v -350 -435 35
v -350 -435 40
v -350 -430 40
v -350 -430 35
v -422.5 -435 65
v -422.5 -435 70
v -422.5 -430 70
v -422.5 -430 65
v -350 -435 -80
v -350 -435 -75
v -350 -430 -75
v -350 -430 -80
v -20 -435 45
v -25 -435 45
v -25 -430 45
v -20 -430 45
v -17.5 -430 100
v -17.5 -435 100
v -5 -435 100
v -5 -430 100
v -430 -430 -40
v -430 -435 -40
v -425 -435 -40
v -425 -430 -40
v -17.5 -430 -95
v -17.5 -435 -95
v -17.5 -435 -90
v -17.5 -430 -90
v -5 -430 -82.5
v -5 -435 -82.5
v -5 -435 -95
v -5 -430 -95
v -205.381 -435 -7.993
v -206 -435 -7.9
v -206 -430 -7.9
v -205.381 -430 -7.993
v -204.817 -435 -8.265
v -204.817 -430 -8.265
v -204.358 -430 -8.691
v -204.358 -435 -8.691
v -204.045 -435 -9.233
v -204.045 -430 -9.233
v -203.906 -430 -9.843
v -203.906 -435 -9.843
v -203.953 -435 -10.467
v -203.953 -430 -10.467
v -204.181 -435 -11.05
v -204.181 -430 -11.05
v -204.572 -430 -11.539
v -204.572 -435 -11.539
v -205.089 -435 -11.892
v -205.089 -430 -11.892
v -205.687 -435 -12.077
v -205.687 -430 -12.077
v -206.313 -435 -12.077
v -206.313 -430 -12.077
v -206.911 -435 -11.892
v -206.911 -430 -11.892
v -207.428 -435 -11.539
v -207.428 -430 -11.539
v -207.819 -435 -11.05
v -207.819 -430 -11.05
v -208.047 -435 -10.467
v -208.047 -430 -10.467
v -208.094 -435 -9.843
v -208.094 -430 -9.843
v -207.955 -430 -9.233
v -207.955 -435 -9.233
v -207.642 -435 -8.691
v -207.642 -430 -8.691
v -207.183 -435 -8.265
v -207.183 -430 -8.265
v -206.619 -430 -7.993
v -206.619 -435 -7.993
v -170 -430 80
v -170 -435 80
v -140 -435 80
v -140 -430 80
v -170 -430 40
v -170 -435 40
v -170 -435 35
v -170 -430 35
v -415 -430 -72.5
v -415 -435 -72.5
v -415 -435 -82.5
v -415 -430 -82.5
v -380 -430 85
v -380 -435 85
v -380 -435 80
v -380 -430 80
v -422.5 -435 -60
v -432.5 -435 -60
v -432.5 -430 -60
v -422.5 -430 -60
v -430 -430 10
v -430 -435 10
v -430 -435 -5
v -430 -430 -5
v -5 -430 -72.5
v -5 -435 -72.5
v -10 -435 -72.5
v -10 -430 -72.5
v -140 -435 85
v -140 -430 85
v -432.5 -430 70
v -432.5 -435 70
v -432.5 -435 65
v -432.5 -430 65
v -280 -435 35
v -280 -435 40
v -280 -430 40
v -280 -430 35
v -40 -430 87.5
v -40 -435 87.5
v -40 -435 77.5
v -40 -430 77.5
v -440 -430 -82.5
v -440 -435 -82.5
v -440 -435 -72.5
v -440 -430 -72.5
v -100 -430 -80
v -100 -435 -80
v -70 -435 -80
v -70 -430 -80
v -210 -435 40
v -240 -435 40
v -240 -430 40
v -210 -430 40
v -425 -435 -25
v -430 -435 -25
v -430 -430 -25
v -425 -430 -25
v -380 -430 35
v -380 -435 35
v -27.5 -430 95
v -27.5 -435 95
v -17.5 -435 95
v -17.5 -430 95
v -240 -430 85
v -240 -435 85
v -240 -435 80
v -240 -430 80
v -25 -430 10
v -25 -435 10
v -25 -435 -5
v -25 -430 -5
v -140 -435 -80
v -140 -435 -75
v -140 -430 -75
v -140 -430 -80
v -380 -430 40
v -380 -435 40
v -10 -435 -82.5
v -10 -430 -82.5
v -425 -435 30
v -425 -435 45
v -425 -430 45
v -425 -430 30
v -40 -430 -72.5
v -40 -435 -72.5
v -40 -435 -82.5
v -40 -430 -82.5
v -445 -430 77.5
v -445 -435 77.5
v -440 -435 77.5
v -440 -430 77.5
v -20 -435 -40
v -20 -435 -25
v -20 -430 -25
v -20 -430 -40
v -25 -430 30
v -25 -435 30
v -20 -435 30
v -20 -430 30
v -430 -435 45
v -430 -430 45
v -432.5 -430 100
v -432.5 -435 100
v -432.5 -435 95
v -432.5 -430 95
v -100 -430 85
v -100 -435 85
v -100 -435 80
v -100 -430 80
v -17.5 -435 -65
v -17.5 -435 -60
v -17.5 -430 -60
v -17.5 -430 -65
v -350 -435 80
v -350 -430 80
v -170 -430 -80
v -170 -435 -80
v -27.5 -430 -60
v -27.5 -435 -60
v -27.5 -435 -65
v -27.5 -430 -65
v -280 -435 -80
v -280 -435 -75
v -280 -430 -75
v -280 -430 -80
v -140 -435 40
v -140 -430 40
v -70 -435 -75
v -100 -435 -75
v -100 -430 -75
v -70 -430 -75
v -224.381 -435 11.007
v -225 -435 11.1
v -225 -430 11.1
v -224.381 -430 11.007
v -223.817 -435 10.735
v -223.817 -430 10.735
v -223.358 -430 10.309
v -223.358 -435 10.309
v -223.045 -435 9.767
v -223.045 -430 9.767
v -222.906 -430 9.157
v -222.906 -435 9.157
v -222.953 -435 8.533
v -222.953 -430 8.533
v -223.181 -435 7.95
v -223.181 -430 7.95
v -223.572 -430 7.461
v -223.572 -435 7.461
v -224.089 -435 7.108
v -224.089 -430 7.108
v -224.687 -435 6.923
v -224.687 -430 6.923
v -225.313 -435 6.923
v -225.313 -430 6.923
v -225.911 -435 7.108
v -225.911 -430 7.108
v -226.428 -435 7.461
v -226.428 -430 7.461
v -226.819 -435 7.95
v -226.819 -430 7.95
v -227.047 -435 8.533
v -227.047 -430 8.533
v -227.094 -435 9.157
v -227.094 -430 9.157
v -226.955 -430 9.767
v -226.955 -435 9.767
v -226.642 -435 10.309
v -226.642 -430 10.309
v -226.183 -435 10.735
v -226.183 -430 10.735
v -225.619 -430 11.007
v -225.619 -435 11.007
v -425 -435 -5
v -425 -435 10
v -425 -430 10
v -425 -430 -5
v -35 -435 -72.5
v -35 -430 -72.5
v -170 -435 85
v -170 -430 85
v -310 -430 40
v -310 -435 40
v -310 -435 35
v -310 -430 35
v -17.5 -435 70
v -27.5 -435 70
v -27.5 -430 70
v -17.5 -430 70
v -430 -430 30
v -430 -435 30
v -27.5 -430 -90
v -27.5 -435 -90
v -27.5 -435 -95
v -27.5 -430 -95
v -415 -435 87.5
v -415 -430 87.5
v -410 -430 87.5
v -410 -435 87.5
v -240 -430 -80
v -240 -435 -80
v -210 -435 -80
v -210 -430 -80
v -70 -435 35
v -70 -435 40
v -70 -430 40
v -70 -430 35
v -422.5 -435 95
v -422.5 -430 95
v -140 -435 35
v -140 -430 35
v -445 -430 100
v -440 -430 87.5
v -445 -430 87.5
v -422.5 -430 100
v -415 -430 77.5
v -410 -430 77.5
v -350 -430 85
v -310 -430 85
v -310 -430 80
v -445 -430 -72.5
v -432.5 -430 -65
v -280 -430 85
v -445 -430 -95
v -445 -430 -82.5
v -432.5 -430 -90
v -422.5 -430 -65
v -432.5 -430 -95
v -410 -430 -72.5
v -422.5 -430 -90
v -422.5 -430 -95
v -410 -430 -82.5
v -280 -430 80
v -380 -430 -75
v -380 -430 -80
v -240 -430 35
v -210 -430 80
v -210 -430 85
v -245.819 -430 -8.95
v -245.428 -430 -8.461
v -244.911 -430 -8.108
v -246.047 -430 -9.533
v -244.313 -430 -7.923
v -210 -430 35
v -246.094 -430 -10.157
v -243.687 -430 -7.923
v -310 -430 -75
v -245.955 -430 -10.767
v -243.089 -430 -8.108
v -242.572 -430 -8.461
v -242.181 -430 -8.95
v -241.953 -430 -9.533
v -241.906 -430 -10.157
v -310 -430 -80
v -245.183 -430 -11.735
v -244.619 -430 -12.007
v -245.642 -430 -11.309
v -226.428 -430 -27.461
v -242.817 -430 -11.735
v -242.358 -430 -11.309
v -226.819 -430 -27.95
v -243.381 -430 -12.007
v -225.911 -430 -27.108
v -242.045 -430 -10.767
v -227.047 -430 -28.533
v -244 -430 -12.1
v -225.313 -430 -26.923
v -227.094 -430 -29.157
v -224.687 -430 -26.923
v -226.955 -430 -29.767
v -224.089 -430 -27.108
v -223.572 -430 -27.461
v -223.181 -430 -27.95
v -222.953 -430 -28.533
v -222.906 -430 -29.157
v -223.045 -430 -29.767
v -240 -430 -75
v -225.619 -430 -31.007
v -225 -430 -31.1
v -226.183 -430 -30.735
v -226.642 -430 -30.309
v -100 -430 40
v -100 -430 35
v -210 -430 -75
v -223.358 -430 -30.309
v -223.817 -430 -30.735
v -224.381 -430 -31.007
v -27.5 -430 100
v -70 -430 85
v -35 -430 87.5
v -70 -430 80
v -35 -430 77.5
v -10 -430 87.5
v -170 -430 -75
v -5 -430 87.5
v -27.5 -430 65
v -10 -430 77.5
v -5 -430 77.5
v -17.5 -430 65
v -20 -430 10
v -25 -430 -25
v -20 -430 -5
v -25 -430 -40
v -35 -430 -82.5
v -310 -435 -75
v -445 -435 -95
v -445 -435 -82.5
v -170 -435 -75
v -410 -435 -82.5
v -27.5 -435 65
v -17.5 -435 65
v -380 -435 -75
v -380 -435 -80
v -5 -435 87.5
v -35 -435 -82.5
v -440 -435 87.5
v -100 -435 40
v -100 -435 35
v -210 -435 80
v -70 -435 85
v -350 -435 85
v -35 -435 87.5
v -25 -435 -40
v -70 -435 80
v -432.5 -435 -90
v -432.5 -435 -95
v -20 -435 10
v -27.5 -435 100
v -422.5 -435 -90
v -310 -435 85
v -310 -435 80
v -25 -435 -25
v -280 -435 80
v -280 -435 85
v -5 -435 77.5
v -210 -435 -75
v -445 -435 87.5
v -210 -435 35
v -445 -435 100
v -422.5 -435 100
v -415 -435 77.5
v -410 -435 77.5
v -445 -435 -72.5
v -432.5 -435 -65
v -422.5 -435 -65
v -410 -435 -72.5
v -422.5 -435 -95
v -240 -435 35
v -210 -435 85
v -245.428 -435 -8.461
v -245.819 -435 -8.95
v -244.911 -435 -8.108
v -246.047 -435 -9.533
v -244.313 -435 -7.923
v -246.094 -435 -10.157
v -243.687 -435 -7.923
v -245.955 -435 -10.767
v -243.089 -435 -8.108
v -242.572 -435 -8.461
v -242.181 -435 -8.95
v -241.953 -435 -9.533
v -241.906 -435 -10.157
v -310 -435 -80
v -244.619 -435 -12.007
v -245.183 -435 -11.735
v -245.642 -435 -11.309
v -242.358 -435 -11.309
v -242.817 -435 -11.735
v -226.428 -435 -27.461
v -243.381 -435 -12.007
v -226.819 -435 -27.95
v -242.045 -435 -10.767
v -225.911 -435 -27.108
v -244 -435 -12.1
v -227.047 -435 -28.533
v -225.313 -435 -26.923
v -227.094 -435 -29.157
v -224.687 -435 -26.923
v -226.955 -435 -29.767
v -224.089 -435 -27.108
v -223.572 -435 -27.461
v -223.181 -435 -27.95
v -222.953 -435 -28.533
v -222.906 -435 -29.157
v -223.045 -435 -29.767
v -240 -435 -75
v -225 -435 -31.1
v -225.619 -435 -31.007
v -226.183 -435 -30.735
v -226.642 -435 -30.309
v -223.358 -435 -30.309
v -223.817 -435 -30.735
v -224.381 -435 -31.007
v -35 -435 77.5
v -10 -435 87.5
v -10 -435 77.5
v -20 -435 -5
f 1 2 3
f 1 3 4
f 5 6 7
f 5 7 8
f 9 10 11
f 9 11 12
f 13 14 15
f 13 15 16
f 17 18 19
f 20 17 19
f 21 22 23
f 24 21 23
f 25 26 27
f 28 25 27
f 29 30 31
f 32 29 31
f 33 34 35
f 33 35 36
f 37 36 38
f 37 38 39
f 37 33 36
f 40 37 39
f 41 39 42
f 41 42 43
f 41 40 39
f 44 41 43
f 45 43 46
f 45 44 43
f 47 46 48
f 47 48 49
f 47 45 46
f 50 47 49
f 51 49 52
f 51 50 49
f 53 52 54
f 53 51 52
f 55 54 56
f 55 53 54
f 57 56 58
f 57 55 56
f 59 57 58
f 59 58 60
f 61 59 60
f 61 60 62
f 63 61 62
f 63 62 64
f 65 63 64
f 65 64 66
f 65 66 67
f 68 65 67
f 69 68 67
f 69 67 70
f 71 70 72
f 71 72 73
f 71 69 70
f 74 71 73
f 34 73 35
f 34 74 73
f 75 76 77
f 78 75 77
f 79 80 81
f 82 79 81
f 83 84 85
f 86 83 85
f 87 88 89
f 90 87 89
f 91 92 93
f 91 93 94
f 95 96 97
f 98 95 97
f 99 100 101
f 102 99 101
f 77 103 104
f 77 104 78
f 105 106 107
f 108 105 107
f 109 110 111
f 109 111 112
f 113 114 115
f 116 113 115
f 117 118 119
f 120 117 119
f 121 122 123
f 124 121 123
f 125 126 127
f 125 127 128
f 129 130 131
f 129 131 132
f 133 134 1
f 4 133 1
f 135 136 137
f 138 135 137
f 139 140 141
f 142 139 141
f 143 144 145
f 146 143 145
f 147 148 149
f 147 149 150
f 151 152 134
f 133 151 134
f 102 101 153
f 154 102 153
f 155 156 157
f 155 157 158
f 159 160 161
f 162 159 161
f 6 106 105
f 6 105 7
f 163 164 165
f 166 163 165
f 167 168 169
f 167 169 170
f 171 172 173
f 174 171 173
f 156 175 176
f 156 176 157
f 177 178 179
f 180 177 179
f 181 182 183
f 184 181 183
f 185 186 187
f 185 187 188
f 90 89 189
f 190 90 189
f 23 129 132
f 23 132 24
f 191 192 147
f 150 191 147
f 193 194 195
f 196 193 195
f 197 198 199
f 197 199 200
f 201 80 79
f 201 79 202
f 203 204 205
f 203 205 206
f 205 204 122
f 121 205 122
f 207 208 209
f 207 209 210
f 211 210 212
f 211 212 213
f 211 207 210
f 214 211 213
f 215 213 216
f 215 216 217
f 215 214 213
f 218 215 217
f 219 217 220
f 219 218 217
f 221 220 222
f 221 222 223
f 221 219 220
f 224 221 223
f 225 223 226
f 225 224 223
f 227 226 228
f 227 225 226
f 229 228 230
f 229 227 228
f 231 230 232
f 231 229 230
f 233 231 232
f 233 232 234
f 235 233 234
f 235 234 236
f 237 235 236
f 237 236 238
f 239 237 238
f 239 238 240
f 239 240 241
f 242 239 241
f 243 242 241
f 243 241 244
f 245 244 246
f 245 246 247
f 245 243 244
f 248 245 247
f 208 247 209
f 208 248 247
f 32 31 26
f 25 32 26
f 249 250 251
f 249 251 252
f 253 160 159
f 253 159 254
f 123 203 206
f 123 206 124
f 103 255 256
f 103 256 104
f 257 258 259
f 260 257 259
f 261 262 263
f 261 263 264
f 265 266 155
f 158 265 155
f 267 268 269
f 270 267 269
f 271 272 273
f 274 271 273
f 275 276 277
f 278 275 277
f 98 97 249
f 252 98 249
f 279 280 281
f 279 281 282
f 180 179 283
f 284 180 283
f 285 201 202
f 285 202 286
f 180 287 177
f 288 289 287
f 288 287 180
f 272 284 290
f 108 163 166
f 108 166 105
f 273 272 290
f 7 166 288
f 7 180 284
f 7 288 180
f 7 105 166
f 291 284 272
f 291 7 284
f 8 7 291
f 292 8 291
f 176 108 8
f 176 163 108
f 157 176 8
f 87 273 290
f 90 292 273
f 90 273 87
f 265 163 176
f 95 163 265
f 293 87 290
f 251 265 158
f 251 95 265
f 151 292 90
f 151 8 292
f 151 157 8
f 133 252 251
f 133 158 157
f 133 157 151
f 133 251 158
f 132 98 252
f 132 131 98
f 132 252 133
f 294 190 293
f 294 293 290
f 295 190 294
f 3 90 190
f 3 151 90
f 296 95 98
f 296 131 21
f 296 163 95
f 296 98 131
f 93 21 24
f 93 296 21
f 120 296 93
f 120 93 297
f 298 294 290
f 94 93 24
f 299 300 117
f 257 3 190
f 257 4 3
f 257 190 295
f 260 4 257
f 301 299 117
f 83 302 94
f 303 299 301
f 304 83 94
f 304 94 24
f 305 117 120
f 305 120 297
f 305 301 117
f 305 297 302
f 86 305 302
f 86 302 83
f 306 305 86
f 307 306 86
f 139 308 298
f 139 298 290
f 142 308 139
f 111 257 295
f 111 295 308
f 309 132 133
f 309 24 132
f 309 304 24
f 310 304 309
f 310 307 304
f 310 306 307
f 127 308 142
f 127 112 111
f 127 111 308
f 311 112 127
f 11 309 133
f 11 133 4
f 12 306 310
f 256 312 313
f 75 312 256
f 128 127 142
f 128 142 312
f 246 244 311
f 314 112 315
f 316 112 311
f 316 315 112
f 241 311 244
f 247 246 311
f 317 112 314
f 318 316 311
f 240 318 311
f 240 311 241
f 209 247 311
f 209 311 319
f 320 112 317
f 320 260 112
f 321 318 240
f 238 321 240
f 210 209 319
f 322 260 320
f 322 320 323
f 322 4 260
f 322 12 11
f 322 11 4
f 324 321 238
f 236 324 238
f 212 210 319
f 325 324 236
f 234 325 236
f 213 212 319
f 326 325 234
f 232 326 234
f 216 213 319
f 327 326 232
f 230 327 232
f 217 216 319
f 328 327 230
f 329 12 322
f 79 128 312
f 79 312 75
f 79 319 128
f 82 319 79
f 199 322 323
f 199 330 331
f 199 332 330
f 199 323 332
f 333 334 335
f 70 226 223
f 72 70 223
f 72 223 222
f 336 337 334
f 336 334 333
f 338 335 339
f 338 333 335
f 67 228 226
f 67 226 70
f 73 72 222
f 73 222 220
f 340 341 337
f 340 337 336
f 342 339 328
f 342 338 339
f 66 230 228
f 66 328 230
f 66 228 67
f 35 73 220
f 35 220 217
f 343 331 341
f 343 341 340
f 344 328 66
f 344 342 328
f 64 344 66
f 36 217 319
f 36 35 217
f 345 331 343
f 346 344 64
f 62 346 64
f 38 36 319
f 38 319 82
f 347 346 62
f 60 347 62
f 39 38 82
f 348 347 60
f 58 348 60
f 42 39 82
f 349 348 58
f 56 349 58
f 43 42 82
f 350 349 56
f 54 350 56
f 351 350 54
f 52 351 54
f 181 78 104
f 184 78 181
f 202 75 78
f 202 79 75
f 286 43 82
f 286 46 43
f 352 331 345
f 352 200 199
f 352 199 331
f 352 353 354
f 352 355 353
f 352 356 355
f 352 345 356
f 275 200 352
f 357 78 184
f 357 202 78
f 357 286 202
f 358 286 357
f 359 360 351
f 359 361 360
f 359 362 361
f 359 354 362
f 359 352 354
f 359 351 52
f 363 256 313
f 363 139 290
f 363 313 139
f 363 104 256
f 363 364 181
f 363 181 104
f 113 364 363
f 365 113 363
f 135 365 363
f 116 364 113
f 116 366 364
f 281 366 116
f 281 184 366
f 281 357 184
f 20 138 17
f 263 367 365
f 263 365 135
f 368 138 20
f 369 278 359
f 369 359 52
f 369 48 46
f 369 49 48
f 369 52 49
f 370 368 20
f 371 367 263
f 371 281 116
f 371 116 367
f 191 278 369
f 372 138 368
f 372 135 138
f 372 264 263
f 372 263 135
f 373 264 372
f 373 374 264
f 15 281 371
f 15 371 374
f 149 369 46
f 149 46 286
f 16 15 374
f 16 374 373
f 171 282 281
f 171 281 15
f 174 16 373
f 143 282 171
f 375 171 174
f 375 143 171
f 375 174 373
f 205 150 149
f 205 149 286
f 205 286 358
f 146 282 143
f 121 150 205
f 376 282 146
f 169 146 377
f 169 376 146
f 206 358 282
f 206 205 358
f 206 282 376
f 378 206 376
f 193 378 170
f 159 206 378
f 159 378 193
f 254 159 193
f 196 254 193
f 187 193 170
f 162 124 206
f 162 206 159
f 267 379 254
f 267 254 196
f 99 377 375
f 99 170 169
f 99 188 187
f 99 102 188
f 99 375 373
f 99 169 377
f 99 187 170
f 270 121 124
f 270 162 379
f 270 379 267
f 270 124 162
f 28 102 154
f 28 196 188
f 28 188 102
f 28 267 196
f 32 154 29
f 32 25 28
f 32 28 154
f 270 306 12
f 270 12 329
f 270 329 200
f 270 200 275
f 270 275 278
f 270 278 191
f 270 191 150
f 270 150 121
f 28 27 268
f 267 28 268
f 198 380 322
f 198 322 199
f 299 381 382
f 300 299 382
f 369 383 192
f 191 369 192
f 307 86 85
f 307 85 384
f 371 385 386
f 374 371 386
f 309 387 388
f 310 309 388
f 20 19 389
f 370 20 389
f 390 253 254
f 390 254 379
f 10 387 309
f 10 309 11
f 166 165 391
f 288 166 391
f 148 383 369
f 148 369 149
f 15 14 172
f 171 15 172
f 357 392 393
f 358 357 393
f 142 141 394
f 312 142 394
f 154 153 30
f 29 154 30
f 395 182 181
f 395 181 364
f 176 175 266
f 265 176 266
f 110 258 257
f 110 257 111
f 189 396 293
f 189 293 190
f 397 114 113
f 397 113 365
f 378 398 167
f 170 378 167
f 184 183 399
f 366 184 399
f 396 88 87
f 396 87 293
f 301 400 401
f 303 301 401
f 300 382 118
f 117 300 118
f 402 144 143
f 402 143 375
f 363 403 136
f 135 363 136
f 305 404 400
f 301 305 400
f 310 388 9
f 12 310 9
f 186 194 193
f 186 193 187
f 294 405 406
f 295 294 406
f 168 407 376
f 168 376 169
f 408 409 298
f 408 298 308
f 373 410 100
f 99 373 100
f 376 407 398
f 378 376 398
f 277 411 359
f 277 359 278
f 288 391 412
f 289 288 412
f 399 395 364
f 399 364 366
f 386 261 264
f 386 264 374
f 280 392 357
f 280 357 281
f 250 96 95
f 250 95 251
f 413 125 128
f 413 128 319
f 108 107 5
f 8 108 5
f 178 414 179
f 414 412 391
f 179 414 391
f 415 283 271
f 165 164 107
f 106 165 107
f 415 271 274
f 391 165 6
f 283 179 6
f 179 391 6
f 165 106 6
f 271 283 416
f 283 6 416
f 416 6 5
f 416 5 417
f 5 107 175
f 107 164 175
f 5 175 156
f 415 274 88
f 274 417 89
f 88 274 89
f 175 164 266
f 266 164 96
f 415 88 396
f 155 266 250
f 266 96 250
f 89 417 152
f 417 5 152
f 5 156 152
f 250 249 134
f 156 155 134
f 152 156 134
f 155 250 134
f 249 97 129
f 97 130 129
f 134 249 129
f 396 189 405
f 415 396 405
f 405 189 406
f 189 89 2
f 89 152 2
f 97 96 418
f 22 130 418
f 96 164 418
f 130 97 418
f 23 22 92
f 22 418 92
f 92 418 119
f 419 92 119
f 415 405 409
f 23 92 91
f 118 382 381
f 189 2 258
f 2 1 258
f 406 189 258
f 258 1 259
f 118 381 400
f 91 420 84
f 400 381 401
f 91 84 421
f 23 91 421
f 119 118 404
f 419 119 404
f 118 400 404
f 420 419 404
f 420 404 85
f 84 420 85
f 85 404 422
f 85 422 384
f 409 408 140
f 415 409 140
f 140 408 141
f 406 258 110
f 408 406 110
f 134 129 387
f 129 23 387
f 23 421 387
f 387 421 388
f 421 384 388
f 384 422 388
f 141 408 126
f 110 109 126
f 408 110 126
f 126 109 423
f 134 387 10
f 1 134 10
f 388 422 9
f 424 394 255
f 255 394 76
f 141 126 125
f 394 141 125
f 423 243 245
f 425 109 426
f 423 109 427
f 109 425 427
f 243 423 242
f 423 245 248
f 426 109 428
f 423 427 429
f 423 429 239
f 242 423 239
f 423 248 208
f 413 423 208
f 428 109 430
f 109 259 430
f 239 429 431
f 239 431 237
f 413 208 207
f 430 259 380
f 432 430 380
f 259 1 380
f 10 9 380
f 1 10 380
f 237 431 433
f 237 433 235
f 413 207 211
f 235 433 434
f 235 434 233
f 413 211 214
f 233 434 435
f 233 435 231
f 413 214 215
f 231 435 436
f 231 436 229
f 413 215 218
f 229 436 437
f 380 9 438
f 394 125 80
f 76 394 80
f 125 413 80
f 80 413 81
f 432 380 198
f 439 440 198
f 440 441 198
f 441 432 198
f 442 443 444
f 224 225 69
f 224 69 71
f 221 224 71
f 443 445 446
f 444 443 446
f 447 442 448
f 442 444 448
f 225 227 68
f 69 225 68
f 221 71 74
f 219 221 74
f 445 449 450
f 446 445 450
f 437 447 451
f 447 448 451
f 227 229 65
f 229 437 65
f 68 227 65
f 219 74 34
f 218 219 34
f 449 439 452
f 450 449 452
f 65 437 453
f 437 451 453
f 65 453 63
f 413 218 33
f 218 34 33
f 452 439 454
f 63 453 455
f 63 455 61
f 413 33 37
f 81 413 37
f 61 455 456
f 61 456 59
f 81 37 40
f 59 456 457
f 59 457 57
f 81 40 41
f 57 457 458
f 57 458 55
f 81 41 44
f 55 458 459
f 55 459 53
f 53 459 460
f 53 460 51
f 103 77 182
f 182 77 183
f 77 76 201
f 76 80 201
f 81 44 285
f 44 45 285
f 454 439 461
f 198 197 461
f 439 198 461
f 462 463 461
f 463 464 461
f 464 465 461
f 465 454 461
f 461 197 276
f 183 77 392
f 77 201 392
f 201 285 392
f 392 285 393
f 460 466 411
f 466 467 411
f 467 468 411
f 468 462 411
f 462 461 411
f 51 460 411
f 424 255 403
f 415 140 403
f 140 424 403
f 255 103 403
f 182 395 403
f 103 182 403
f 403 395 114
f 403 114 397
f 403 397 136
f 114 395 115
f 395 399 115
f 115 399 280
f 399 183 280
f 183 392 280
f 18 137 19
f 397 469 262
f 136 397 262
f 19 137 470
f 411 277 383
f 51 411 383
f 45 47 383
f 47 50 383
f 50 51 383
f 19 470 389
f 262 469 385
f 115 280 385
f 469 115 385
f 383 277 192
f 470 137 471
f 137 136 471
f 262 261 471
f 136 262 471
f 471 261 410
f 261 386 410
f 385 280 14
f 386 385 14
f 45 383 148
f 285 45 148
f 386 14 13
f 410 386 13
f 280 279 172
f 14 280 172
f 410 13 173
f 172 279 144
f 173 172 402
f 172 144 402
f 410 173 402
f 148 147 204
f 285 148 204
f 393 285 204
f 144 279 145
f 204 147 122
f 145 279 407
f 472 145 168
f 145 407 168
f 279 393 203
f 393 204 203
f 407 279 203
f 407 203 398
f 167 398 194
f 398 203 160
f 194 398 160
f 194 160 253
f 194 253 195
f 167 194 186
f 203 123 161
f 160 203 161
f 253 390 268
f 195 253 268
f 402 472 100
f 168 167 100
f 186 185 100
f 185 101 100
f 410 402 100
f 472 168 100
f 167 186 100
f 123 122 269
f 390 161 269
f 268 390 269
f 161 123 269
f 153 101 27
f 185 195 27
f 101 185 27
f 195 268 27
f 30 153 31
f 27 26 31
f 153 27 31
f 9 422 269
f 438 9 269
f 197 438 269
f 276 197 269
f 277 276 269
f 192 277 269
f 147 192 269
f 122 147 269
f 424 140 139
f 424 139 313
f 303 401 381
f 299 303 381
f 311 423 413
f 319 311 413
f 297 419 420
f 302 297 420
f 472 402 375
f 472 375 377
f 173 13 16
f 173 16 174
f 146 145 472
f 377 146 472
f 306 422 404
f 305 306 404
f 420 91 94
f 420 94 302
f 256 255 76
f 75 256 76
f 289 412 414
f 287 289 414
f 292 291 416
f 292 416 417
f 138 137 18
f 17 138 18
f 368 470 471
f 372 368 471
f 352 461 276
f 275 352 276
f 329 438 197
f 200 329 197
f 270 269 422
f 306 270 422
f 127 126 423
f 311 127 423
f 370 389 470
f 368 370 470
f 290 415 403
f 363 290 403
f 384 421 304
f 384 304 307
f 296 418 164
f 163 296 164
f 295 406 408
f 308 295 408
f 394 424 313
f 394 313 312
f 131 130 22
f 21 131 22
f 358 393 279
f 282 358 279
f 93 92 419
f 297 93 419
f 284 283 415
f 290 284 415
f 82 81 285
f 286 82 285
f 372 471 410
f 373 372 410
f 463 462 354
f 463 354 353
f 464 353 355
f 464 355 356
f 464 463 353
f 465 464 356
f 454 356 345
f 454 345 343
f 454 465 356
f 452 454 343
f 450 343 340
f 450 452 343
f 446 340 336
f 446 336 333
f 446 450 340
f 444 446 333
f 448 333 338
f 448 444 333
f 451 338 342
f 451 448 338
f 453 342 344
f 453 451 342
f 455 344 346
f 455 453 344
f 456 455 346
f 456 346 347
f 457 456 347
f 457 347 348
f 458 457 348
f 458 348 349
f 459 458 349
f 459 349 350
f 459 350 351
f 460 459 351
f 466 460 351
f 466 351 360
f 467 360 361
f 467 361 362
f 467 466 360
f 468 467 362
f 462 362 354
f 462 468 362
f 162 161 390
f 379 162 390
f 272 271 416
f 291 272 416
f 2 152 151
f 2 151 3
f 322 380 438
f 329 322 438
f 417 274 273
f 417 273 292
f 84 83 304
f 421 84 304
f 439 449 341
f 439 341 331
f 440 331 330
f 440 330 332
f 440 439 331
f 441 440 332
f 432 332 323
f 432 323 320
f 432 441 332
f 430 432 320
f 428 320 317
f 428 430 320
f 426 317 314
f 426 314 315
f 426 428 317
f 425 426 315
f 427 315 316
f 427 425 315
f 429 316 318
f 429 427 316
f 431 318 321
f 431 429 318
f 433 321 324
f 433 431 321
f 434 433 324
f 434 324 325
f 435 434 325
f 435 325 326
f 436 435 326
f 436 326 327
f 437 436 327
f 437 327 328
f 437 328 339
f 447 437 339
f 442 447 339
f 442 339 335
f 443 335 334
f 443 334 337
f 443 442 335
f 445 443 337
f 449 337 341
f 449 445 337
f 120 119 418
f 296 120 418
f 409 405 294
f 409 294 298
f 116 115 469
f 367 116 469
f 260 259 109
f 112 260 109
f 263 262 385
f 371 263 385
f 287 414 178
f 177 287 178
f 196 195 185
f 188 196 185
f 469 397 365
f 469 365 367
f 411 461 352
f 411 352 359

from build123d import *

# Parameters (mm, degrees)
SKETCH2_R           = 2.1
SKETCH2_W           = 30
SKETCH2_H           = 5
SKETCH2_W_2         = 10
SKETCH2_W_3         = 4.999728605
SKETCH2_H_2         = 10
SKETCH2_W_4         = 5
SKETCH2_H_3         = 15
BOSS_EXTRUDE1_DEPTH = 5


with BuildPart() as part:
    # Sketch2 → Boss-Extrude1 (new body)
    with BuildSketch(Plane(origin=(0, -435, 0), x_dir=(1, 0, 0), z_dir=(0, 1, 0))):
        Polygon((-17.5, -95), (-17.5, -100), (-5, -100), (-5, -87.5), (-10, -87.5), (-10, -77.5), (-5, -77.5), (-5, 72.5), (-10, 72.5), (-10, 82.5), (-5, 82.5), (-5, 95), (-17.5, 95), (-17.5, 90), (-27.5, 90), (-27.5, 95), (-422.5, 95), (-422.5, 90), (-432.5, 90), (-432.5, 95), (-445, 95), (-445, 82.5), (-440, 82.5), (-440, 72.5), (-445, 72.5), (-445, -77.5), (-440, -77.5), (-440, -87.5), (-445, -87.5), (-445, -100), (-432.5, -100), (-432.5, -95), (-422.5, -95), (-422.5, -100), (-27.5, -100), (-27.5, -95), align=None)
        with Locations(Location((-225, -9, 0), (0, 0, 270))):
            Circle(SKETCH2_R, mode=Mode.SUBTRACT)
        with Locations(Location((-225, 29, 0), (0, 0, 90))):
            Circle(SKETCH2_R, mode=Mode.SUBTRACT)
        with Locations(Location((-206, 10, 0), (0, 0, 270))):
            Circle(SKETCH2_R, mode=Mode.SUBTRACT)
        with Locations(Location((-244, 10, 0), (0, 0, 90))):
            Circle(SKETCH2_R, mode=Mode.SUBTRACT)
        with Locations((-85, -82.5)):
            Rectangle(SKETCH2_W, SKETCH2_H, mode=Mode.SUBTRACT)
        with Locations((-155, -82.5)):
            Rectangle(SKETCH2_W, SKETCH2_H, mode=Mode.SUBTRACT)
        with Locations((-22.5, 62.5)):
            Rectangle(SKETCH2_W_2, SKETCH2_H, mode=Mode.SUBTRACT)
        with Locations((-225, -82.5)):
            Rectangle(SKETCH2_W, SKETCH2_H, mode=Mode.SUBTRACT)
        with Locations((-37.500135697, 77.5)):
            Rectangle(SKETCH2_W_3, SKETCH2_H_2, mode=Mode.SUBTRACT)
        with Locations((-427.5, -37.5)):
            Rectangle(SKETCH2_W_4, SKETCH2_H_3, mode=Mode.SUBTRACT)
        with Locations((-427.5, 62.5)):
            Rectangle(SKETCH2_W_2, SKETCH2_H, mode=Mode.SUBTRACT)
        with Locations((-427.5, -2.5)):
            Rectangle(SKETCH2_W_4, SKETCH2_H_3, mode=Mode.SUBTRACT)
        with Locations((-412.499864302, 77.5)):
            Rectangle(SKETCH2_W_3, SKETCH2_H_2, mode=Mode.SUBTRACT)
        with Locations((-427.5, 32.5)):
            Rectangle(SKETCH2_W_4, SKETCH2_H_3, mode=Mode.SUBTRACT)
        with Locations((-412.499864302, -82.5)):
            Rectangle(SKETCH2_W_3, SKETCH2_H_2, mode=Mode.SUBTRACT)
        with Locations((-22.5, 32.5)):
            Rectangle(SKETCH2_W_4, SKETCH2_H_3, mode=Mode.SUBTRACT)
        with Locations((-427.5, -67.5)):
            Rectangle(SKETCH2_W_2, SKETCH2_H, mode=Mode.SUBTRACT)
        with Locations((-22.5, -2.5)):
            Rectangle(SKETCH2_W_4, SKETCH2_H_3, mode=Mode.SUBTRACT)
        with Locations((-22.5, -67.5)):
            Rectangle(SKETCH2_W_2, SKETCH2_H, mode=Mode.SUBTRACT)
        with Locations((-22.5, -37.5)):
            Rectangle(SKETCH2_W_4, SKETCH2_H_3, mode=Mode.SUBTRACT)
        with Locations((-37.500135697, -82.5)):
            Rectangle(SKETCH2_W_3, SKETCH2_H_2, mode=Mode.SUBTRACT)
        with Locations((-295, -82.5)):
            Rectangle(SKETCH2_W, SKETCH2_H, mode=Mode.SUBTRACT)
        with Locations((-365, -82.5)):
            Rectangle(SKETCH2_W, SKETCH2_H, mode=Mode.SUBTRACT)
        with Locations((-365, 77.5)):
            Rectangle(SKETCH2_W, SKETCH2_H, mode=Mode.SUBTRACT)
        with Locations((-295, 77.5)):
            Rectangle(SKETCH2_W, SKETCH2_H, mode=Mode.SUBTRACT)
        with Locations((-225, 77.5)):
            Rectangle(SKETCH2_W, SKETCH2_H, mode=Mode.SUBTRACT)
        with Locations((-155, 77.5)):
            Rectangle(SKETCH2_W, SKETCH2_H, mode=Mode.SUBTRACT)
        with Locations((-85, 77.5)):
            Rectangle(SKETCH2_W, SKETCH2_H, mode=Mode.SUBTRACT)
        with Locations((-365, -37.5)):
            Rectangle(SKETCH2_W, SKETCH2_H, mode=Mode.SUBTRACT)
        with Locations((-295, -37.5)):
            Rectangle(SKETCH2_W, SKETCH2_H, mode=Mode.SUBTRACT)
        with Locations((-225, -37.5)):
            Rectangle(SKETCH2_W, SKETCH2_H, mode=Mode.SUBTRACT)
        with Locations((-155, -37.5)):
            Rectangle(SKETCH2_W, SKETCH2_H, mode=Mode.SUBTRACT)
        with Locations((-85, -37.5)):
            Rectangle(SKETCH2_W, SKETCH2_H, mode=Mode.SUBTRACT)
    extrude(amount=BOSS_EXTRUDE1_DEPTH)


solid = part.part
